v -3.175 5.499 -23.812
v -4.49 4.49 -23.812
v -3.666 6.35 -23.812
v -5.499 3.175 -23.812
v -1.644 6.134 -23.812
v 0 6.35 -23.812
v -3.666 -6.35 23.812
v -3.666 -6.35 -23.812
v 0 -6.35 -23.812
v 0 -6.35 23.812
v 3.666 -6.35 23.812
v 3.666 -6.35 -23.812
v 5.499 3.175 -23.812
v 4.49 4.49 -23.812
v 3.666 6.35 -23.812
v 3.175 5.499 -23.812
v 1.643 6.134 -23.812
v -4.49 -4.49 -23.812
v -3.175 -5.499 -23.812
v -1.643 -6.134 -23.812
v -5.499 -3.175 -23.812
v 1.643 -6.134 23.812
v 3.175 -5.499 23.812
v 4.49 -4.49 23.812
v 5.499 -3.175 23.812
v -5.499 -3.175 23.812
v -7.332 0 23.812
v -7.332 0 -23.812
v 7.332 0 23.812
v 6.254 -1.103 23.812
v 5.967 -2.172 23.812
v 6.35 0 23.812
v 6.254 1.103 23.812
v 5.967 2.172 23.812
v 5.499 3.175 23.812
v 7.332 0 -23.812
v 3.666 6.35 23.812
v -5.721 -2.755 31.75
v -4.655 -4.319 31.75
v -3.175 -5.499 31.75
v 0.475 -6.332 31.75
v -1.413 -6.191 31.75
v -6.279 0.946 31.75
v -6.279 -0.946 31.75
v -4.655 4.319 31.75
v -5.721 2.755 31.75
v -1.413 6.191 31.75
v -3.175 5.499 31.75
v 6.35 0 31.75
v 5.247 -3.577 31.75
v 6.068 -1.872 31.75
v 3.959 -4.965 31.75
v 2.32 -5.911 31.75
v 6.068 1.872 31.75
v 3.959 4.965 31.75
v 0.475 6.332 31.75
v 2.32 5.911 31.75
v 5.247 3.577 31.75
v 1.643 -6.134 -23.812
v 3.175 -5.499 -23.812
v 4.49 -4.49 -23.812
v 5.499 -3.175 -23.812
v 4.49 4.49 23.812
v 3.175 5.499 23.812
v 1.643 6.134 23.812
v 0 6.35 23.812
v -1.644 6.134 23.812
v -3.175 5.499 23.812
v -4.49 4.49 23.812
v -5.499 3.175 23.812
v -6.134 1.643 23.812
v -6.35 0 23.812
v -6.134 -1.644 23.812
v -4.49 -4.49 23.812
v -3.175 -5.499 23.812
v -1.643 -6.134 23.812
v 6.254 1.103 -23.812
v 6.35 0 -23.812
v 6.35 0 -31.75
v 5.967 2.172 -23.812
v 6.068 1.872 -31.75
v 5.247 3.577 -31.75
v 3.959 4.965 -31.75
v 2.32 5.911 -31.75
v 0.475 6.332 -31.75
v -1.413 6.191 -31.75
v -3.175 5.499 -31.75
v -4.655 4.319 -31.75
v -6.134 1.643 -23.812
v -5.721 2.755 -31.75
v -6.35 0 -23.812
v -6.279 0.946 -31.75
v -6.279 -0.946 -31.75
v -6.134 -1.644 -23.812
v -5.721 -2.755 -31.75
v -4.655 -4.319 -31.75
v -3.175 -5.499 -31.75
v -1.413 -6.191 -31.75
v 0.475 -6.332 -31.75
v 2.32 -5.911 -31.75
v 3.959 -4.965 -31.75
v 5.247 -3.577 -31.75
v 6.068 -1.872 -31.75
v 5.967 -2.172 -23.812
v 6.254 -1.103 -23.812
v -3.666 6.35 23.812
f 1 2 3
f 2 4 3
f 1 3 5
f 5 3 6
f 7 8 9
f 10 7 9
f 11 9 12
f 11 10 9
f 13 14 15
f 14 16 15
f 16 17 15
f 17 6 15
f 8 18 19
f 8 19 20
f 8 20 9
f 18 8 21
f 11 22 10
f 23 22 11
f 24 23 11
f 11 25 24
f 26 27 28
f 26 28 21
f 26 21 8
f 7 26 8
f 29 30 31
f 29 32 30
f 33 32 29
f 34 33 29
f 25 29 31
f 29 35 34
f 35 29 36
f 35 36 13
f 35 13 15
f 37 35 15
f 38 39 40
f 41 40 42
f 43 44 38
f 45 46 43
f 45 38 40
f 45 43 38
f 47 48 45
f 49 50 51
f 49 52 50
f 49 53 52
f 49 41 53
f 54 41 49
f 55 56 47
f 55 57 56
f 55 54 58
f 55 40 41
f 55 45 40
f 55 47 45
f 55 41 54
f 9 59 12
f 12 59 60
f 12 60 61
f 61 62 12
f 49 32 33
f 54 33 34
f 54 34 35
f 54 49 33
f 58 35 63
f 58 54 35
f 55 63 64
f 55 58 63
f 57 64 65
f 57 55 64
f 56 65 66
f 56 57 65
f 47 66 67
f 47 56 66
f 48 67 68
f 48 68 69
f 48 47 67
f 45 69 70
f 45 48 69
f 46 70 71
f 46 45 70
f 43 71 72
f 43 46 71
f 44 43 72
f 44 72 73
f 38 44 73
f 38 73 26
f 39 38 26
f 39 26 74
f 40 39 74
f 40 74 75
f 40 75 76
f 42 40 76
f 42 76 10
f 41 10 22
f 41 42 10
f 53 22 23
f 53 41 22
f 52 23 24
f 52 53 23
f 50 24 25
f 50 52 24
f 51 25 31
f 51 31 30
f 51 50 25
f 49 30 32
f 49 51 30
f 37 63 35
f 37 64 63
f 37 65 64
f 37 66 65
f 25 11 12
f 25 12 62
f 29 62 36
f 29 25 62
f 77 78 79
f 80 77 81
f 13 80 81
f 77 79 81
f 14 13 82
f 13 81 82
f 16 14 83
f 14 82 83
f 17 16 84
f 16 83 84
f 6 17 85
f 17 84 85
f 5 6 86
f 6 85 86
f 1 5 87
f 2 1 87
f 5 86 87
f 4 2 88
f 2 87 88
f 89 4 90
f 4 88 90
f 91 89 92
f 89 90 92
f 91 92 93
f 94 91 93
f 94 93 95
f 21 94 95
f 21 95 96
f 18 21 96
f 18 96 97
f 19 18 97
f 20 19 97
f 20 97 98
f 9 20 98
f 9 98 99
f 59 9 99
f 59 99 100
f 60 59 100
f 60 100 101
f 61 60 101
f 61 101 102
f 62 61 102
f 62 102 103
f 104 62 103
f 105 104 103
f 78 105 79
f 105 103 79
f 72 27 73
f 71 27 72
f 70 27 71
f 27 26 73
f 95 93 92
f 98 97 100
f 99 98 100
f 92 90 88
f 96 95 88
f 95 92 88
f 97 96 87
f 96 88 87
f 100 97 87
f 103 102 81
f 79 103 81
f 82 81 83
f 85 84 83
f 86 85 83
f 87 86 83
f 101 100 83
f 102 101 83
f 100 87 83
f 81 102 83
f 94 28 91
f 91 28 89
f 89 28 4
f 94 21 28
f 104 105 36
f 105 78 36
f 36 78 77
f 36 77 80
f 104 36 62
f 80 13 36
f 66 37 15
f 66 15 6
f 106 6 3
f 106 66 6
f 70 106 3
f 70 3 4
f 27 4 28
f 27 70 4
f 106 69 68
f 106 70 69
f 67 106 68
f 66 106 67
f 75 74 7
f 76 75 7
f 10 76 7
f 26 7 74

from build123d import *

# Parameters (mm, degrees)
BOSS_EXTRUDE1_DEPTH     = 31.75
SKETCH2_R               = 8.89
SKETCH2_R_2             = 6.35
CUT_EXTRUDE_THIN1_DEPTH = 7.9375


with BuildPart() as part:
    # Sketch1 → Boss-Extrude1 (new, symmetric)
    with BuildSketch(Plane.XY):
        Polygon((7.332348419, 0), (3.666174209, 6.35), (-3.666174209, 6.35), (-7.332348419, 0), (-3.666174209, -6.35), (3.666174209, -6.35), align=None)
    extrude(amount=BOSS_EXTRUDE1_DEPTH, both=True)

    # Sketch2 → Cut-Extrude-Thin1 (cut)
    with BuildSketch(Plane.XY.offset(31.75)):
        Circle(SKETCH2_R)
        Circle(SKETCH2_R_2, mode=Mode.SUBTRACT)
    cut_extrude_thin1 = extrude(amount=-CUT_EXTRUDE_THIN1_DEPTH, mode=Mode.SUBTRACT)

    # Mirror1: Cut-Extrude-Thin1 across plane
    add(cut_extrude_thin1.mirror(Plane.XY), mode=Mode.SUBTRACT)


solid = part.part
